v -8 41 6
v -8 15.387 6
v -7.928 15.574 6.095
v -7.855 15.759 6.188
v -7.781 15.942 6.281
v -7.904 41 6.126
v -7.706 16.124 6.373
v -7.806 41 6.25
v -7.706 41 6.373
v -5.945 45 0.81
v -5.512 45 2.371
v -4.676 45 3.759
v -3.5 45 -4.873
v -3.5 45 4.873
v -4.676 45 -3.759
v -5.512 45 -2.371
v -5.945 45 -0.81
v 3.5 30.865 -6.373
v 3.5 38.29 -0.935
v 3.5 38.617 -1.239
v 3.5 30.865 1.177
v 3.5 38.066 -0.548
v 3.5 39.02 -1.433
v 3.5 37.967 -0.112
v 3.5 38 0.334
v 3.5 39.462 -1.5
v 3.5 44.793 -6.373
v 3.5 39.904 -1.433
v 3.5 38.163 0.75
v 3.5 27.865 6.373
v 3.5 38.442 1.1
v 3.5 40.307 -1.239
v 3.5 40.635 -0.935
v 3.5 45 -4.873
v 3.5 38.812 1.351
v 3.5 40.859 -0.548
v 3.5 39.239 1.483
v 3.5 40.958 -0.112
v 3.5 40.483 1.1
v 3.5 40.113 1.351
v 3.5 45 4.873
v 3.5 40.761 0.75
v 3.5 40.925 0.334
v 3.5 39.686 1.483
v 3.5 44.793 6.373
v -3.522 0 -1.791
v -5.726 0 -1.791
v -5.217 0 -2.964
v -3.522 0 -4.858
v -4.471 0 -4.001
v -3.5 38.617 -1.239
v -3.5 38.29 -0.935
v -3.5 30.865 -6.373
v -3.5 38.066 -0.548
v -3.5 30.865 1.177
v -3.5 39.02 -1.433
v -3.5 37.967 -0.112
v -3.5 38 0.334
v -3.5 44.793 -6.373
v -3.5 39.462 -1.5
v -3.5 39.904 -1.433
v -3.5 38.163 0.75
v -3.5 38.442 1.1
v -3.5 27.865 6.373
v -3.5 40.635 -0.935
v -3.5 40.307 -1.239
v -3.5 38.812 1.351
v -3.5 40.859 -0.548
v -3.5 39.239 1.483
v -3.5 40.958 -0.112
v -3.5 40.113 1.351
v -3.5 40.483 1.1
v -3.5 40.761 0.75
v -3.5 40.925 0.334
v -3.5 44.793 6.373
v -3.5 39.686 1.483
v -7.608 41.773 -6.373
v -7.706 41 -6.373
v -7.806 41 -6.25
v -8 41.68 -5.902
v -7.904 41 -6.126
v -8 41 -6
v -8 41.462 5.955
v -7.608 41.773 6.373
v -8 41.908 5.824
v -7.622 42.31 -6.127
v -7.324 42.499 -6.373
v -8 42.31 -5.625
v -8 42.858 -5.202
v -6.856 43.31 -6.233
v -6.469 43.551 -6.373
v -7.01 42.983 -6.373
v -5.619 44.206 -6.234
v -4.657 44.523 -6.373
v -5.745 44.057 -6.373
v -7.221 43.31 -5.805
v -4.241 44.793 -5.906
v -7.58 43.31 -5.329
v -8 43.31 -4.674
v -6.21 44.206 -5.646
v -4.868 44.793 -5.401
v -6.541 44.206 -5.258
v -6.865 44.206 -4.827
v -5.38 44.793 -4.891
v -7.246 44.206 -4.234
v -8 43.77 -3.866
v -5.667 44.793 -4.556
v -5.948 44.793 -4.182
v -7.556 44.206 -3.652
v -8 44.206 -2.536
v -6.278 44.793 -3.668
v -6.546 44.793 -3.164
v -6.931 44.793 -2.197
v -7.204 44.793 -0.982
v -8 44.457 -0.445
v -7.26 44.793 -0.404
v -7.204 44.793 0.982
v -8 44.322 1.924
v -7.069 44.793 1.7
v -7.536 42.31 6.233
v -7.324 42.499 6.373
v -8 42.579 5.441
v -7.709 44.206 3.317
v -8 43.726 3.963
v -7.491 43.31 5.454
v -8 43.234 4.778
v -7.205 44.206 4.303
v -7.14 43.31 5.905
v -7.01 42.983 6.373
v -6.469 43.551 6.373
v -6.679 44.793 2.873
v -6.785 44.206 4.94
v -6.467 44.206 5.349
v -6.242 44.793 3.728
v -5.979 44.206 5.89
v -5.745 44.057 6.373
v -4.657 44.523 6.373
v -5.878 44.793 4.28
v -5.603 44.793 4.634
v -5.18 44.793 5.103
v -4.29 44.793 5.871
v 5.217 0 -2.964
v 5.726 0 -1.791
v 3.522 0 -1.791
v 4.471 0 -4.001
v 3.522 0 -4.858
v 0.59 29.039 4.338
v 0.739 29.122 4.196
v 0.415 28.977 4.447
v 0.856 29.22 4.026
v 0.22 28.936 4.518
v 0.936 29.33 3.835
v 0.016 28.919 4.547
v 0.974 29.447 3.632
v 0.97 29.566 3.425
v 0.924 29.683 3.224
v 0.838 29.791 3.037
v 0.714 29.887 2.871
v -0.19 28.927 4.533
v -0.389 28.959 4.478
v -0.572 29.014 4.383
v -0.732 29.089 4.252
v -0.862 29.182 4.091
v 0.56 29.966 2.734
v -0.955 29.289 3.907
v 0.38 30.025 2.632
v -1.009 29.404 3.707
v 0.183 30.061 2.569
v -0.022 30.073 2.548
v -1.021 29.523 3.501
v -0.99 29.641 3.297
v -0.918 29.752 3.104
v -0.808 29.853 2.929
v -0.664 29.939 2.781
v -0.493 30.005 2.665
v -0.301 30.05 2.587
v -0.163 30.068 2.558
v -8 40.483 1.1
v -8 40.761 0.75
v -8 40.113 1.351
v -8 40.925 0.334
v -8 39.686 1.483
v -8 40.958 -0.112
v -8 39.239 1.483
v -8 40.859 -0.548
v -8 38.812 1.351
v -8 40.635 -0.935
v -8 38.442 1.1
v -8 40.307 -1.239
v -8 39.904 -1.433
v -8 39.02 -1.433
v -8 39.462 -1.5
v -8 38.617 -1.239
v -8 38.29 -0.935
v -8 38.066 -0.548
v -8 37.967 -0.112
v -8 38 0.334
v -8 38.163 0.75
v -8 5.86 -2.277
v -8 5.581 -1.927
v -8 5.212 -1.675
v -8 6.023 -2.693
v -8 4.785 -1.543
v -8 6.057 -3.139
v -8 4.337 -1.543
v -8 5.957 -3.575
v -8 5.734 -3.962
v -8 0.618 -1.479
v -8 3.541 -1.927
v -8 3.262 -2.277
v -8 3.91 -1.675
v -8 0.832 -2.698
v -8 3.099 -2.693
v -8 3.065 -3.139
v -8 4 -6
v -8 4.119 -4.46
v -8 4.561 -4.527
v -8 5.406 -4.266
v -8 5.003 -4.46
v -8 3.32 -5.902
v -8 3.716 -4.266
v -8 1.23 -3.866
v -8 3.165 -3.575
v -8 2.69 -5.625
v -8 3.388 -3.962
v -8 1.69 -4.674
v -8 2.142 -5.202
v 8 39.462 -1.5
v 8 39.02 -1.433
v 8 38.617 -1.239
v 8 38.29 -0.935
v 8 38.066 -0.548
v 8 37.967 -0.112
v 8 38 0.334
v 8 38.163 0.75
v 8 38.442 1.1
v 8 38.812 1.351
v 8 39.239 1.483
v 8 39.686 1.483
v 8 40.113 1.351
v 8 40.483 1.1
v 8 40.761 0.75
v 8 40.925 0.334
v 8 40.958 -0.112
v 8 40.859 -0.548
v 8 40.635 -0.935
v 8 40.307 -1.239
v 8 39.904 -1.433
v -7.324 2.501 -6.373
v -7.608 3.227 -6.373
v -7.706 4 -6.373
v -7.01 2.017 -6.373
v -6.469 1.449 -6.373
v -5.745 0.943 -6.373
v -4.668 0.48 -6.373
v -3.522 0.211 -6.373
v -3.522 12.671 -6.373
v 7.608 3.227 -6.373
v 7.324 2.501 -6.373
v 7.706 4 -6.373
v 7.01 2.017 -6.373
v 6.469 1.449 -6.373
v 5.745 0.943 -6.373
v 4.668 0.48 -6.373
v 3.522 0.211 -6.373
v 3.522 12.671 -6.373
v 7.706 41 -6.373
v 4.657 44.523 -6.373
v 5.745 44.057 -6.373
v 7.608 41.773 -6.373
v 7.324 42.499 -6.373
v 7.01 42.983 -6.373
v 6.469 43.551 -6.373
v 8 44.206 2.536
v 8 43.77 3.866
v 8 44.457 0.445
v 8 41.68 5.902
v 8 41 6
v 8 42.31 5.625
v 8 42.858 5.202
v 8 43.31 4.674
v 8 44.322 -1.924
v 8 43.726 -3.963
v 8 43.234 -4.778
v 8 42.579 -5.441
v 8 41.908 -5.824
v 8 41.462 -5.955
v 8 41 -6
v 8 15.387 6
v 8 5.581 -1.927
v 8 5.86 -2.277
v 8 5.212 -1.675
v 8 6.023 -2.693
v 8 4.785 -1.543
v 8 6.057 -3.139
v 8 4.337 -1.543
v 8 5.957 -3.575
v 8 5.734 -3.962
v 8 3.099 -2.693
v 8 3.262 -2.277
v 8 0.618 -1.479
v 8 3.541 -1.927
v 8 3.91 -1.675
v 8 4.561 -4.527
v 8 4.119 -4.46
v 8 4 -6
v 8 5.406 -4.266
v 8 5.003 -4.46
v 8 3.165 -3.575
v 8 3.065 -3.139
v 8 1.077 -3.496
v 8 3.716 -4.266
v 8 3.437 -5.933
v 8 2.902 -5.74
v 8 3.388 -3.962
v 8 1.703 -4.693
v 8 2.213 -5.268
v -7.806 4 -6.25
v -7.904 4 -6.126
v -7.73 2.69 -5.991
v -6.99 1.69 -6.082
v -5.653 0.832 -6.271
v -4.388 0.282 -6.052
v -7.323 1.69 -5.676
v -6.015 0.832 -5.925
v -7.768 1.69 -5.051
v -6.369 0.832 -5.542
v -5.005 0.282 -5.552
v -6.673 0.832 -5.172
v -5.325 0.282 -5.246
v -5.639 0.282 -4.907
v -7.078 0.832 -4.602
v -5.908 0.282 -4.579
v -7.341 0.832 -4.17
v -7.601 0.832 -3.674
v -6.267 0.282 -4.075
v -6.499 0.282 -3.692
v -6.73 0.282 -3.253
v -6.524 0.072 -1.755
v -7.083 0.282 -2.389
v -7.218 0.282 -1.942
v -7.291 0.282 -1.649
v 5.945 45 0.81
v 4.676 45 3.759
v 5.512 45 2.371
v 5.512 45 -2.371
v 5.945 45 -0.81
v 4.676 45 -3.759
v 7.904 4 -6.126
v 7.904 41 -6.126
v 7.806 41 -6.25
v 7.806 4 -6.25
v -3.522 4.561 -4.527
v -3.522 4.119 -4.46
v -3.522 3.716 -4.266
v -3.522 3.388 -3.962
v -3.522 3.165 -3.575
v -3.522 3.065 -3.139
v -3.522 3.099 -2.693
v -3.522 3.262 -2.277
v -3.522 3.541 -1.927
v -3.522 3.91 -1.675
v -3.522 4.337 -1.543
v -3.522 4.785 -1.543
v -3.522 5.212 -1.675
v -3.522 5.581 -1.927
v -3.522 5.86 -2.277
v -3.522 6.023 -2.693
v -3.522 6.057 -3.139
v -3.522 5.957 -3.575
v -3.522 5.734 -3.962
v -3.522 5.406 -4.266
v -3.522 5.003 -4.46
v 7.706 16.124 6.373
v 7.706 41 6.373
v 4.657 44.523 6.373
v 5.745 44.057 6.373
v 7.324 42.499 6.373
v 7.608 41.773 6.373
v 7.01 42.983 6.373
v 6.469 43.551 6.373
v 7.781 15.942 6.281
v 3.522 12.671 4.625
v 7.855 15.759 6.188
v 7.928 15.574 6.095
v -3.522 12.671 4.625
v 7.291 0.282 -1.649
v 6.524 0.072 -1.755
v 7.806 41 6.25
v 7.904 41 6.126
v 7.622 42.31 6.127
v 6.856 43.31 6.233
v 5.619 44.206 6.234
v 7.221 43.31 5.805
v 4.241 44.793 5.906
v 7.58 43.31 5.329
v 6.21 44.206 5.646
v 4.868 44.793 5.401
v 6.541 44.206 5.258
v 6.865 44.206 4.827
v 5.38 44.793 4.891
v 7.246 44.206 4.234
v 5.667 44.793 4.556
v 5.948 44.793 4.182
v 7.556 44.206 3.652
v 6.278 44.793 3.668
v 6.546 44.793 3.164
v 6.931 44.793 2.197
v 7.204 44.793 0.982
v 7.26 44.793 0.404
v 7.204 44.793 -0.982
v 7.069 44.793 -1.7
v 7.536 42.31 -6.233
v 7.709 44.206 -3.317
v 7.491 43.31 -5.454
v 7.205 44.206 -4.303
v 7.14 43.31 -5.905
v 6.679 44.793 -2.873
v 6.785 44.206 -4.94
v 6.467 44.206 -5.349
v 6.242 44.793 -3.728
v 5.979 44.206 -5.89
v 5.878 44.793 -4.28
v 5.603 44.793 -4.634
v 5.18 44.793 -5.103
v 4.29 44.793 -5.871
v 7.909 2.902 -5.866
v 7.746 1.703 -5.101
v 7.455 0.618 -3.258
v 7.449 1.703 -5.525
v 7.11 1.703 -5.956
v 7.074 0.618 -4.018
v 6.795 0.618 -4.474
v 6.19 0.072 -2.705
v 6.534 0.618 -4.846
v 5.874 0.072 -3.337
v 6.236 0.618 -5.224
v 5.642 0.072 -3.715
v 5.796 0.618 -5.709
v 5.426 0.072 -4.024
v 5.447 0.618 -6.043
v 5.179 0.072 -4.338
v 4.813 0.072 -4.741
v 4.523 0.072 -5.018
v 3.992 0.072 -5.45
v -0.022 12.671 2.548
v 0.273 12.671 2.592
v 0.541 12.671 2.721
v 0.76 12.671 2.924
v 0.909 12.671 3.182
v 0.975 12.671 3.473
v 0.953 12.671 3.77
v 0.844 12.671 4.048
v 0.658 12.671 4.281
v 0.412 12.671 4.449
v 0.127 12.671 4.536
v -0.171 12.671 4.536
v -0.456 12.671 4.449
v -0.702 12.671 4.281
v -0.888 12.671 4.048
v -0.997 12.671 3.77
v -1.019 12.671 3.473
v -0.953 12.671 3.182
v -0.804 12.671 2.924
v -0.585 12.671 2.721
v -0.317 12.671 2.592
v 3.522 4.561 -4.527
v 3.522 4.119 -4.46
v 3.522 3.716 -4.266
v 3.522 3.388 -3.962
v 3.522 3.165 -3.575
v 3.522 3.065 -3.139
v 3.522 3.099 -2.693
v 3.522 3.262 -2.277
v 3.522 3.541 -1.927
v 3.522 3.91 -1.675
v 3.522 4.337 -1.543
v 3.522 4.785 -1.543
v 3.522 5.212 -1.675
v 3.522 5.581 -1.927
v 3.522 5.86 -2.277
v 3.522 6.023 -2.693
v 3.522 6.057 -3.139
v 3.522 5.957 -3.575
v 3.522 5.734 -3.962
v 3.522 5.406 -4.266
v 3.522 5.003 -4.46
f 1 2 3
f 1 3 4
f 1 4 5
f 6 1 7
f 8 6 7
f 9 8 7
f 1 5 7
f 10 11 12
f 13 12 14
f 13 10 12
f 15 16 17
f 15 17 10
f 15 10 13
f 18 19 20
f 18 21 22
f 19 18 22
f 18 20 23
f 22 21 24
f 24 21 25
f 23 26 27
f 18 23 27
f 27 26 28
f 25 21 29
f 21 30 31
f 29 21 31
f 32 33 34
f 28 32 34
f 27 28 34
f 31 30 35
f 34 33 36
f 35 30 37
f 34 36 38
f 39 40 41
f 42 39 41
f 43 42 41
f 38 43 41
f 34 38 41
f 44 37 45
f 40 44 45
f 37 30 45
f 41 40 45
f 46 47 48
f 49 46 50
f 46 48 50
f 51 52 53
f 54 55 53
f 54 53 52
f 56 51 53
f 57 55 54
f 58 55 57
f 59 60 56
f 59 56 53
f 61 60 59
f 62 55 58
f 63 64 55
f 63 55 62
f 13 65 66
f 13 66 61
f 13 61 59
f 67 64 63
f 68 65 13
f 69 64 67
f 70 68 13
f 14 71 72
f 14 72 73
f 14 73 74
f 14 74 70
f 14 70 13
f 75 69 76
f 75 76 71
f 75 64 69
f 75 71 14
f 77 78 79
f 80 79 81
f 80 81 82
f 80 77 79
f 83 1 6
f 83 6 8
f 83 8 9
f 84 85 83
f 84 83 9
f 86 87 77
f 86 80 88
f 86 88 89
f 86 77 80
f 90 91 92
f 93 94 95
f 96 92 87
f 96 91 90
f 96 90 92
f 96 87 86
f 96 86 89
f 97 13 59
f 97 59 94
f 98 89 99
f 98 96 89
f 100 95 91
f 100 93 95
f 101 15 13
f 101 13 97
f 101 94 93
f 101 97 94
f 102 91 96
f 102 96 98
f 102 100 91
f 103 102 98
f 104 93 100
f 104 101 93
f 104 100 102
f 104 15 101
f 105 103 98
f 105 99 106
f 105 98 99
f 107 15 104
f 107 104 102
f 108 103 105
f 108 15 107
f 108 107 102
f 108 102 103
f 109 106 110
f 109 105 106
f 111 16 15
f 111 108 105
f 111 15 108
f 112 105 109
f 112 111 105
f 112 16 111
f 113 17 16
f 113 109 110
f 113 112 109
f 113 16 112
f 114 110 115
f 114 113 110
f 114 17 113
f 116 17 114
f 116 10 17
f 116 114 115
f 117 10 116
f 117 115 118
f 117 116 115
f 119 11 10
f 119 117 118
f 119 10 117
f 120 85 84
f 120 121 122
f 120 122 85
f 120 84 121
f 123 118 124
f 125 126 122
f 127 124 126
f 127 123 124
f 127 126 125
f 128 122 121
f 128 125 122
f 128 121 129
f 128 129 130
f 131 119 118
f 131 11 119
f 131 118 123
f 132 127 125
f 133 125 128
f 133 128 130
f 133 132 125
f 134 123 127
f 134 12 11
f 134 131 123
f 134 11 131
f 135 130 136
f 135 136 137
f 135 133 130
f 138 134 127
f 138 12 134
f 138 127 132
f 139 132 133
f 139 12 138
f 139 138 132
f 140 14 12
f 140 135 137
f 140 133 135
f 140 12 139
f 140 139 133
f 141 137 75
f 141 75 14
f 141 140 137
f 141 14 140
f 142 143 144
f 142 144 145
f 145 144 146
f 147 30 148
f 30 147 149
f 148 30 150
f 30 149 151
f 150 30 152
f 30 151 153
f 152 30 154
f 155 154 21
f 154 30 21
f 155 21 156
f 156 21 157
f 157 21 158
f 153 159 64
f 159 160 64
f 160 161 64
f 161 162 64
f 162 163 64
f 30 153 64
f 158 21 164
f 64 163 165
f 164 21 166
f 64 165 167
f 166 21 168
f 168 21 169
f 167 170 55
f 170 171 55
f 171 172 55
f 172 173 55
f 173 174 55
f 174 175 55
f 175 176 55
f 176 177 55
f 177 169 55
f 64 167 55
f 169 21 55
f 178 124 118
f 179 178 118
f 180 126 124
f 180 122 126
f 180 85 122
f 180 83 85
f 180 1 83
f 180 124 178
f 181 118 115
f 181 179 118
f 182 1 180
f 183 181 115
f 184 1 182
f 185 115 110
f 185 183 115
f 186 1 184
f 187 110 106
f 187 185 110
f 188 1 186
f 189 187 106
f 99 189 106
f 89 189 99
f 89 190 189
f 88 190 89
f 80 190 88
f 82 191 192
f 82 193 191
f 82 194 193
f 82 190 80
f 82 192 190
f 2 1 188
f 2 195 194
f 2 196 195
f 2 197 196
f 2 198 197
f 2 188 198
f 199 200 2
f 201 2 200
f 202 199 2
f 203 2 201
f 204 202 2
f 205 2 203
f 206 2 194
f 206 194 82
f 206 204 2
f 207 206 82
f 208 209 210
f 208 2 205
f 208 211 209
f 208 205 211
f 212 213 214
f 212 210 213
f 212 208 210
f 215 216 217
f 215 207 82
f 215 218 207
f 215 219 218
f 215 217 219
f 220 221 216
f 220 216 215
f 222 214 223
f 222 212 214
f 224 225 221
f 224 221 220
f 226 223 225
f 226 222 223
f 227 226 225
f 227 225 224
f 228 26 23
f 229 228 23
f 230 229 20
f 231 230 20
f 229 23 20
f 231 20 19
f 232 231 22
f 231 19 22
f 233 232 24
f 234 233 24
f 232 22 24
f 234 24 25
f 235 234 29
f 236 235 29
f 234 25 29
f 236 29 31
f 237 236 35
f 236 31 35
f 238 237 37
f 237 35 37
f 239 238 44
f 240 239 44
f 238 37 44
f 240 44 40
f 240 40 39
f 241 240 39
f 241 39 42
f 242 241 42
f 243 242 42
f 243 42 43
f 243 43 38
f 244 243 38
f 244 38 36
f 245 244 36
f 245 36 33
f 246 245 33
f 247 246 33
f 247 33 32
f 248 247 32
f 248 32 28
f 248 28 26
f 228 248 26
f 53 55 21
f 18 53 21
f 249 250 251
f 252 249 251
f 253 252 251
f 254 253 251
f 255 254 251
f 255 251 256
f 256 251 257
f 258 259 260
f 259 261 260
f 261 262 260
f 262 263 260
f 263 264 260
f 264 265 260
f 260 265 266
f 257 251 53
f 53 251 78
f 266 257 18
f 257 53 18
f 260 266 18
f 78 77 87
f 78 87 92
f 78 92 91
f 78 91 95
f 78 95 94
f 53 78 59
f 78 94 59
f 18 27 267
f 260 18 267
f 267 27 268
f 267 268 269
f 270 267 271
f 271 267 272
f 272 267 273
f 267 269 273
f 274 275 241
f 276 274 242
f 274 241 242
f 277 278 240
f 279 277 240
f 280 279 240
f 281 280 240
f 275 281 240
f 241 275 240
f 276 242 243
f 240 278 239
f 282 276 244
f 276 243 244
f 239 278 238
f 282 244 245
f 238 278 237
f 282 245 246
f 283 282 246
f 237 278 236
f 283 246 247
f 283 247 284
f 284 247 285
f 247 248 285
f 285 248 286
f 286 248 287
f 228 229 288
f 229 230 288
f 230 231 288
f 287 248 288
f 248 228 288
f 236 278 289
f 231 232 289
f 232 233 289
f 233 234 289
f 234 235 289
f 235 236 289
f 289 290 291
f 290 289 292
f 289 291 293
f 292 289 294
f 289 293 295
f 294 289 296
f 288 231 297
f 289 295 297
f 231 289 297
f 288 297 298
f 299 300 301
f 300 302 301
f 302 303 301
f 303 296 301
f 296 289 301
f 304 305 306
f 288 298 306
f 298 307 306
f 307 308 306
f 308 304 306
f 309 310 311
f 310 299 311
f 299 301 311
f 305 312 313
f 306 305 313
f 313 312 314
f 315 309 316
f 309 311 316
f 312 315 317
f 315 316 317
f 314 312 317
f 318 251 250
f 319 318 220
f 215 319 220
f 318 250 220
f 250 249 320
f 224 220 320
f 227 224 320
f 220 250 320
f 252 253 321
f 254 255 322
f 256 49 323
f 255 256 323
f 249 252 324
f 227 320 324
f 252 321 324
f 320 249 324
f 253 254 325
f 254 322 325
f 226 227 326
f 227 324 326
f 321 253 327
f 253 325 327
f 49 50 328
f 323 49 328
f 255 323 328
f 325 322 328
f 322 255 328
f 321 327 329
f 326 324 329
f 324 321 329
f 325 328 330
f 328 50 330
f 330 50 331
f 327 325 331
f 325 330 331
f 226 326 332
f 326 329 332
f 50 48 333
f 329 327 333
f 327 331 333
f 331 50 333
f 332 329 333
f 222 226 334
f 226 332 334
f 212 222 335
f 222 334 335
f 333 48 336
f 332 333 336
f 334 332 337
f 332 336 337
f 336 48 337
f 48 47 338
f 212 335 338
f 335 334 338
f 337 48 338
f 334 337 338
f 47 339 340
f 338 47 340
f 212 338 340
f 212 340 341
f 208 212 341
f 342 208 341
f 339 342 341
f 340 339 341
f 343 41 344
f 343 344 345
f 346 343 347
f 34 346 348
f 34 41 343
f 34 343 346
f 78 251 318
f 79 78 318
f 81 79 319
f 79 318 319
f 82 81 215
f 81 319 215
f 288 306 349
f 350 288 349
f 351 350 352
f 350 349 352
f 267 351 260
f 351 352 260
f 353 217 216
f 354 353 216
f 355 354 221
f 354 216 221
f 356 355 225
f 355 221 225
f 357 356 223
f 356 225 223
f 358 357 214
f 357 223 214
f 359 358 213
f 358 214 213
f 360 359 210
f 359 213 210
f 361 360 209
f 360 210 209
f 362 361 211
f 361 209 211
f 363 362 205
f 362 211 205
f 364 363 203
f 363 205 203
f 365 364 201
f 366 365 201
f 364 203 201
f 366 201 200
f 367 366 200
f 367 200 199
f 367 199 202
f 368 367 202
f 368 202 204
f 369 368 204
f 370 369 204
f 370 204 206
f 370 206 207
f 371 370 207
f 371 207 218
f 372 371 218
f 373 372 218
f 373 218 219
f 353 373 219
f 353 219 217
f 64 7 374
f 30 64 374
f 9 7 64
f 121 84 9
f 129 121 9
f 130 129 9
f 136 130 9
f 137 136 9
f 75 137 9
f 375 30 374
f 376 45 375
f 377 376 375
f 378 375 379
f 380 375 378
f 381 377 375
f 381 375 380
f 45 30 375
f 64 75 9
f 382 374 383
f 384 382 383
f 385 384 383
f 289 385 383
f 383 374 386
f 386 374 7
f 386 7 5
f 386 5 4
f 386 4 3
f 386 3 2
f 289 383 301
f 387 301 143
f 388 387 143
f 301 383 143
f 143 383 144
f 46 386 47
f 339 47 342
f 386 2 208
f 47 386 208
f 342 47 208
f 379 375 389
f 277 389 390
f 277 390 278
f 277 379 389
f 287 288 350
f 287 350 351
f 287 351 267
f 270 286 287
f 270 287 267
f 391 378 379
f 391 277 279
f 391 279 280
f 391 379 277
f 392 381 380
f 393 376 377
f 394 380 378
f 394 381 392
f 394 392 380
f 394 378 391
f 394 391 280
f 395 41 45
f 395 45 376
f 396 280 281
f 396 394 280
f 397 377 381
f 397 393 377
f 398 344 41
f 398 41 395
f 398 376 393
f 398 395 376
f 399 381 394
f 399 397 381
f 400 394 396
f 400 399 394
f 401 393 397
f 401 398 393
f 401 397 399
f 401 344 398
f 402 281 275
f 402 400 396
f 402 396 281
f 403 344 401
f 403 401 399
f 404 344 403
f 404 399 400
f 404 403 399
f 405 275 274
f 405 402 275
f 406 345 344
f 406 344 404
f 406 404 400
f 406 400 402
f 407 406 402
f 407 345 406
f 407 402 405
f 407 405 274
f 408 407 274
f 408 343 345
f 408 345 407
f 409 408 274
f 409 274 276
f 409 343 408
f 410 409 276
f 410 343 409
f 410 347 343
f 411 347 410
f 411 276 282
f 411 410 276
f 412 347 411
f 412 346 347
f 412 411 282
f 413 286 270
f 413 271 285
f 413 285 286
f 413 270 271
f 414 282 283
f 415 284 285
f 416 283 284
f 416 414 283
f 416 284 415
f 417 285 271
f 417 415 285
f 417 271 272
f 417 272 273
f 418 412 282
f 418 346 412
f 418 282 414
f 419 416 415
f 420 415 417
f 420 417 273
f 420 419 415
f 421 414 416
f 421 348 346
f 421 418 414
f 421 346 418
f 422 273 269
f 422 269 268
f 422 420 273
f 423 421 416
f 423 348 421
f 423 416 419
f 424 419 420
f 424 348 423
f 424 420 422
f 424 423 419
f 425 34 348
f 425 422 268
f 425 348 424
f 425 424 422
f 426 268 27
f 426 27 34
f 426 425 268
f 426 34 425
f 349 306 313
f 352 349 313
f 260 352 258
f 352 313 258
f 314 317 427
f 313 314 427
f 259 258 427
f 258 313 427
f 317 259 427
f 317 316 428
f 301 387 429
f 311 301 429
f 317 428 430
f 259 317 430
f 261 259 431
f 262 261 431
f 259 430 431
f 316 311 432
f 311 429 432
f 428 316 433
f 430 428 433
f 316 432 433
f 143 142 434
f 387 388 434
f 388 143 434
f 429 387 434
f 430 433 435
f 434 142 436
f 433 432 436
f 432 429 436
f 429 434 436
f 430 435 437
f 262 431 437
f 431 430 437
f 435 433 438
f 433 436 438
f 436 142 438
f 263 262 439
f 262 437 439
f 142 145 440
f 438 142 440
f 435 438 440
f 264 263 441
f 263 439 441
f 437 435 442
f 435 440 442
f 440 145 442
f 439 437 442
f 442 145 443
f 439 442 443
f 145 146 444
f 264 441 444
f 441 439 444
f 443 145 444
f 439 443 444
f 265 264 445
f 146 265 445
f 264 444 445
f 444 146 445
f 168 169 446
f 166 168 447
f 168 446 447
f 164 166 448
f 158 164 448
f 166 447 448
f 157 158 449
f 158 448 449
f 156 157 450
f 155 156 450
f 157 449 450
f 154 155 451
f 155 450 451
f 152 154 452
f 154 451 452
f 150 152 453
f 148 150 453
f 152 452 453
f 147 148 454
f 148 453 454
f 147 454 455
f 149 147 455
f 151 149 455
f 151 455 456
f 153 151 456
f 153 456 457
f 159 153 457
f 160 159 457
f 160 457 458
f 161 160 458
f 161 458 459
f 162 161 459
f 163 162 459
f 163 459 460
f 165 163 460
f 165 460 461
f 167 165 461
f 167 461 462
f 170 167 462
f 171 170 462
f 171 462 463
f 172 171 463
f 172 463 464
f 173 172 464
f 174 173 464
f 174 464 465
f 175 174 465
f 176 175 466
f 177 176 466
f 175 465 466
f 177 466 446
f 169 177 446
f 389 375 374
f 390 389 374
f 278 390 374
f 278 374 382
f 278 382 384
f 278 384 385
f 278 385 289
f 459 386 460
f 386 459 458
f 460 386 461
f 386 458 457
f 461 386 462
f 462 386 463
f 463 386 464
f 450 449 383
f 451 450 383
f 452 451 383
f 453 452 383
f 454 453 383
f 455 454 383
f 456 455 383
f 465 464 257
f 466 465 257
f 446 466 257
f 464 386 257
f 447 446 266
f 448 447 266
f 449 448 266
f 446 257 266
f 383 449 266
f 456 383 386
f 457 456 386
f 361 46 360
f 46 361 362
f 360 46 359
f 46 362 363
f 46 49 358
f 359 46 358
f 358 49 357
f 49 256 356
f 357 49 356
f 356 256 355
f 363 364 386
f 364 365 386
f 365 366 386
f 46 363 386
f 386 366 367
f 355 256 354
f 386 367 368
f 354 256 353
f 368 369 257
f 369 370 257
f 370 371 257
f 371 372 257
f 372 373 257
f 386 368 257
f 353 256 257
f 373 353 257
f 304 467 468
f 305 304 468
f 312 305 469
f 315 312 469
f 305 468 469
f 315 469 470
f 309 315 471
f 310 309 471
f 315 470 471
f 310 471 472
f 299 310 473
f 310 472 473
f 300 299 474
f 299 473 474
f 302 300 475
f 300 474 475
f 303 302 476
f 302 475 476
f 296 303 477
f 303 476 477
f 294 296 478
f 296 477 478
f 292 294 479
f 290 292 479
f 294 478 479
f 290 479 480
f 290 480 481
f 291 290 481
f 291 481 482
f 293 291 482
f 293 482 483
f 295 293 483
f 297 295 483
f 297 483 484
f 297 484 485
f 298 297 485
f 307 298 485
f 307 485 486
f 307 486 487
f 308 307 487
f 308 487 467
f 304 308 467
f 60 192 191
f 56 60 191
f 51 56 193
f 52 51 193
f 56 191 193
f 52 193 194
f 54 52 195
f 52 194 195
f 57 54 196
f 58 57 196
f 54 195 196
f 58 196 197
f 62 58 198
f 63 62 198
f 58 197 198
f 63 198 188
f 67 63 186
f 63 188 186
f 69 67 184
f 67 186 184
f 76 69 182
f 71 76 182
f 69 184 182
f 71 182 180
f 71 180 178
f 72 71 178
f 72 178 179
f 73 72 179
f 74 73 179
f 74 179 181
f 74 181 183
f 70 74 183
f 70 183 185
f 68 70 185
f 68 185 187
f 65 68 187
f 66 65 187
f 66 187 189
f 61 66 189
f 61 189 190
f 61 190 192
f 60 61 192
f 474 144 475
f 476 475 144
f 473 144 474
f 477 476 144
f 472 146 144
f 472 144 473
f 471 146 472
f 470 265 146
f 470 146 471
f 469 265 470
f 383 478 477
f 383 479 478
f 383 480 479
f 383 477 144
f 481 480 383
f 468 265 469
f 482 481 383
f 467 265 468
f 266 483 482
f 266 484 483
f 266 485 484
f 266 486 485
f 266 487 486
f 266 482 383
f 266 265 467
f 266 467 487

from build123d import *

# Parameters (mm, degrees)
SKETCH1_R           = 10
EXTRUDE1_DEPTH      = 45
FILLET1_R           = 4
SKETCH2_W           = 7.044053374
SKETCH2_H           = 25.342236328
SKETCH2_W_2         = 7
SKETCH2_H_2         = 23.94716261
EXTRUDE2_DEPTH      = 20
SKETCH5_W           = 5.258419436
SKETCH5_H           = 20.959398048
EXTRUDE4_DEPTH      = 48.169905777
SKETCH11_W          = 21.968744981
SKETCH11_H          = 5.630856805
EXTRUDE10_DEPTH     = 47.786750374
SKETCH12_R          = 1.5
EXTRUDE11_DEPTH     = 49.183163121
SKETCH13_R          = 1.5
EXTRUDE12_DEPTH     = 49.183163121
CHAMFER_1_SIZE      = 3
CHAMFER_1_SIZE2     = 5.196152423
SKETCH_1_R          = 1
CUT_EXTRUDE_1_DEPTH = 34.908314691


with BuildPart() as part:
    # Sketch1 → Extrude1 (new body)
    with BuildSketch(Plane(origin=(0, 0, 0), x_dir=(1, 0, 0), z_dir=(0, 1, 0))):
        with Locations(Location((0, 0, 0), (0, 0, 90))):
            Circle(SKETCH1_R)
    extrude(amount=EXTRUDE1_DEPTH)

    # Fillet1
    fillet1_edges = [part.edges().sort_by_distance(p)[0] for p in [
        (0, 0, 10),
        (0, 45, 10),
    ]]
    fillet(fillet1_edges, radius=FILLET1_R)

    # Sketch2 → Extrude2 (cut, symmetric)
    with BuildSketch(Plane.XY):
        Rectangle(SKETCH2_W, SKETCH2_H)
        with Locations((0, 42.838233159)):
            Rectangle(SKETCH2_W_2, SKETCH2_H_2)
    extrude(amount=EXTRUDE2_DEPTH, both=True, mode=Mode.SUBTRACT)

    # Sketch5 → Extrude4 (cut, through all)
    with BuildSketch(Plane(origin=(0, 0, 0), x_dir=(1, 0, 0), z_dir=(0, 1, 0))):
        with Locations((10.629209718, 0.450601309)):
            Rectangle(SKETCH5_W, SKETCH5_H)
        with Locations((-10.629209718, 0.450601309)):
            Rectangle(SKETCH5_W, SKETCH5_H)
    extrude(amount=EXTRUDE4_DEPTH, mode=Mode.SUBTRACT)

    # Sketch11 → Extrude10 (cut, through all)
    with BuildSketch(Plane(origin=(0, 45, 0), x_dir=(1, 0, 0), z_dir=(0, 1, 0))):
        with Locations((-0.154491877, -9.18859048)):
            Rectangle(SKETCH11_W, SKETCH11_H)
        with Locations((-0.154491877, 9.18859048)):
            Rectangle(SKETCH11_W, SKETCH11_H)
    extrude(amount=-EXTRUDE10_DEPTH, mode=Mode.SUBTRACT)

    # Sketch12 → Extrude11 (cut, through all)
    with BuildSketch(Plane.ZY.offset(8)):
        with Locations(Location((0, 39.462335046, 0), (0, 0, 180))):
            Circle(SKETCH12_R)
    extrude(amount=-EXTRUDE11_DEPTH, mode=Mode.SUBTRACT)

    # Sketch13 → Extrude12 (cut, through all)
    with BuildSketch(Plane.ZY.offset(8)):
        with Locations(Location((-3.026564036, 4.561005479, 0), (0, 0, 180))):
            Circle(SKETCH13_R)
        Polygon((6.818378582, 17.003077145), (-1.791354285, 0), (6.818378582, 0), align=None)
    extrude(amount=-EXTRUDE12_DEPTH, mode=Mode.SUBTRACT)

    # Фаска1
    chamfer_1_edges = [part.edges().sort_by_distance(p)[0] for p in [
        (0, 30.864651854, 6.373162077),
    ]]
    chamfer_1_side = [part.faces().sort_by_distance(p)[0] for p in [
        (0, 28.01207475, 6.373162077),
    ]]
    chamfer(chamfer_1_edges, length=CHAMFER_1_SIZE, length2=CHAMFER_1_SIZE2, reference=chamfer_1_side[0])

    # Эскиз1 → Вырез-Вытянуть1 (cut, through all)
    with BuildSketch(Plane.XZ.offset(-12.671118164)):
        with Locations(Location((-0.022026687, 3.547657951, 0), (0, 0, 270))):
            Circle(SKETCH_1_R)
    extrude(amount=-CUT_EXTRUDE_1_DEPTH, mode=Mode.SUBTRACT)


solid = part.part
